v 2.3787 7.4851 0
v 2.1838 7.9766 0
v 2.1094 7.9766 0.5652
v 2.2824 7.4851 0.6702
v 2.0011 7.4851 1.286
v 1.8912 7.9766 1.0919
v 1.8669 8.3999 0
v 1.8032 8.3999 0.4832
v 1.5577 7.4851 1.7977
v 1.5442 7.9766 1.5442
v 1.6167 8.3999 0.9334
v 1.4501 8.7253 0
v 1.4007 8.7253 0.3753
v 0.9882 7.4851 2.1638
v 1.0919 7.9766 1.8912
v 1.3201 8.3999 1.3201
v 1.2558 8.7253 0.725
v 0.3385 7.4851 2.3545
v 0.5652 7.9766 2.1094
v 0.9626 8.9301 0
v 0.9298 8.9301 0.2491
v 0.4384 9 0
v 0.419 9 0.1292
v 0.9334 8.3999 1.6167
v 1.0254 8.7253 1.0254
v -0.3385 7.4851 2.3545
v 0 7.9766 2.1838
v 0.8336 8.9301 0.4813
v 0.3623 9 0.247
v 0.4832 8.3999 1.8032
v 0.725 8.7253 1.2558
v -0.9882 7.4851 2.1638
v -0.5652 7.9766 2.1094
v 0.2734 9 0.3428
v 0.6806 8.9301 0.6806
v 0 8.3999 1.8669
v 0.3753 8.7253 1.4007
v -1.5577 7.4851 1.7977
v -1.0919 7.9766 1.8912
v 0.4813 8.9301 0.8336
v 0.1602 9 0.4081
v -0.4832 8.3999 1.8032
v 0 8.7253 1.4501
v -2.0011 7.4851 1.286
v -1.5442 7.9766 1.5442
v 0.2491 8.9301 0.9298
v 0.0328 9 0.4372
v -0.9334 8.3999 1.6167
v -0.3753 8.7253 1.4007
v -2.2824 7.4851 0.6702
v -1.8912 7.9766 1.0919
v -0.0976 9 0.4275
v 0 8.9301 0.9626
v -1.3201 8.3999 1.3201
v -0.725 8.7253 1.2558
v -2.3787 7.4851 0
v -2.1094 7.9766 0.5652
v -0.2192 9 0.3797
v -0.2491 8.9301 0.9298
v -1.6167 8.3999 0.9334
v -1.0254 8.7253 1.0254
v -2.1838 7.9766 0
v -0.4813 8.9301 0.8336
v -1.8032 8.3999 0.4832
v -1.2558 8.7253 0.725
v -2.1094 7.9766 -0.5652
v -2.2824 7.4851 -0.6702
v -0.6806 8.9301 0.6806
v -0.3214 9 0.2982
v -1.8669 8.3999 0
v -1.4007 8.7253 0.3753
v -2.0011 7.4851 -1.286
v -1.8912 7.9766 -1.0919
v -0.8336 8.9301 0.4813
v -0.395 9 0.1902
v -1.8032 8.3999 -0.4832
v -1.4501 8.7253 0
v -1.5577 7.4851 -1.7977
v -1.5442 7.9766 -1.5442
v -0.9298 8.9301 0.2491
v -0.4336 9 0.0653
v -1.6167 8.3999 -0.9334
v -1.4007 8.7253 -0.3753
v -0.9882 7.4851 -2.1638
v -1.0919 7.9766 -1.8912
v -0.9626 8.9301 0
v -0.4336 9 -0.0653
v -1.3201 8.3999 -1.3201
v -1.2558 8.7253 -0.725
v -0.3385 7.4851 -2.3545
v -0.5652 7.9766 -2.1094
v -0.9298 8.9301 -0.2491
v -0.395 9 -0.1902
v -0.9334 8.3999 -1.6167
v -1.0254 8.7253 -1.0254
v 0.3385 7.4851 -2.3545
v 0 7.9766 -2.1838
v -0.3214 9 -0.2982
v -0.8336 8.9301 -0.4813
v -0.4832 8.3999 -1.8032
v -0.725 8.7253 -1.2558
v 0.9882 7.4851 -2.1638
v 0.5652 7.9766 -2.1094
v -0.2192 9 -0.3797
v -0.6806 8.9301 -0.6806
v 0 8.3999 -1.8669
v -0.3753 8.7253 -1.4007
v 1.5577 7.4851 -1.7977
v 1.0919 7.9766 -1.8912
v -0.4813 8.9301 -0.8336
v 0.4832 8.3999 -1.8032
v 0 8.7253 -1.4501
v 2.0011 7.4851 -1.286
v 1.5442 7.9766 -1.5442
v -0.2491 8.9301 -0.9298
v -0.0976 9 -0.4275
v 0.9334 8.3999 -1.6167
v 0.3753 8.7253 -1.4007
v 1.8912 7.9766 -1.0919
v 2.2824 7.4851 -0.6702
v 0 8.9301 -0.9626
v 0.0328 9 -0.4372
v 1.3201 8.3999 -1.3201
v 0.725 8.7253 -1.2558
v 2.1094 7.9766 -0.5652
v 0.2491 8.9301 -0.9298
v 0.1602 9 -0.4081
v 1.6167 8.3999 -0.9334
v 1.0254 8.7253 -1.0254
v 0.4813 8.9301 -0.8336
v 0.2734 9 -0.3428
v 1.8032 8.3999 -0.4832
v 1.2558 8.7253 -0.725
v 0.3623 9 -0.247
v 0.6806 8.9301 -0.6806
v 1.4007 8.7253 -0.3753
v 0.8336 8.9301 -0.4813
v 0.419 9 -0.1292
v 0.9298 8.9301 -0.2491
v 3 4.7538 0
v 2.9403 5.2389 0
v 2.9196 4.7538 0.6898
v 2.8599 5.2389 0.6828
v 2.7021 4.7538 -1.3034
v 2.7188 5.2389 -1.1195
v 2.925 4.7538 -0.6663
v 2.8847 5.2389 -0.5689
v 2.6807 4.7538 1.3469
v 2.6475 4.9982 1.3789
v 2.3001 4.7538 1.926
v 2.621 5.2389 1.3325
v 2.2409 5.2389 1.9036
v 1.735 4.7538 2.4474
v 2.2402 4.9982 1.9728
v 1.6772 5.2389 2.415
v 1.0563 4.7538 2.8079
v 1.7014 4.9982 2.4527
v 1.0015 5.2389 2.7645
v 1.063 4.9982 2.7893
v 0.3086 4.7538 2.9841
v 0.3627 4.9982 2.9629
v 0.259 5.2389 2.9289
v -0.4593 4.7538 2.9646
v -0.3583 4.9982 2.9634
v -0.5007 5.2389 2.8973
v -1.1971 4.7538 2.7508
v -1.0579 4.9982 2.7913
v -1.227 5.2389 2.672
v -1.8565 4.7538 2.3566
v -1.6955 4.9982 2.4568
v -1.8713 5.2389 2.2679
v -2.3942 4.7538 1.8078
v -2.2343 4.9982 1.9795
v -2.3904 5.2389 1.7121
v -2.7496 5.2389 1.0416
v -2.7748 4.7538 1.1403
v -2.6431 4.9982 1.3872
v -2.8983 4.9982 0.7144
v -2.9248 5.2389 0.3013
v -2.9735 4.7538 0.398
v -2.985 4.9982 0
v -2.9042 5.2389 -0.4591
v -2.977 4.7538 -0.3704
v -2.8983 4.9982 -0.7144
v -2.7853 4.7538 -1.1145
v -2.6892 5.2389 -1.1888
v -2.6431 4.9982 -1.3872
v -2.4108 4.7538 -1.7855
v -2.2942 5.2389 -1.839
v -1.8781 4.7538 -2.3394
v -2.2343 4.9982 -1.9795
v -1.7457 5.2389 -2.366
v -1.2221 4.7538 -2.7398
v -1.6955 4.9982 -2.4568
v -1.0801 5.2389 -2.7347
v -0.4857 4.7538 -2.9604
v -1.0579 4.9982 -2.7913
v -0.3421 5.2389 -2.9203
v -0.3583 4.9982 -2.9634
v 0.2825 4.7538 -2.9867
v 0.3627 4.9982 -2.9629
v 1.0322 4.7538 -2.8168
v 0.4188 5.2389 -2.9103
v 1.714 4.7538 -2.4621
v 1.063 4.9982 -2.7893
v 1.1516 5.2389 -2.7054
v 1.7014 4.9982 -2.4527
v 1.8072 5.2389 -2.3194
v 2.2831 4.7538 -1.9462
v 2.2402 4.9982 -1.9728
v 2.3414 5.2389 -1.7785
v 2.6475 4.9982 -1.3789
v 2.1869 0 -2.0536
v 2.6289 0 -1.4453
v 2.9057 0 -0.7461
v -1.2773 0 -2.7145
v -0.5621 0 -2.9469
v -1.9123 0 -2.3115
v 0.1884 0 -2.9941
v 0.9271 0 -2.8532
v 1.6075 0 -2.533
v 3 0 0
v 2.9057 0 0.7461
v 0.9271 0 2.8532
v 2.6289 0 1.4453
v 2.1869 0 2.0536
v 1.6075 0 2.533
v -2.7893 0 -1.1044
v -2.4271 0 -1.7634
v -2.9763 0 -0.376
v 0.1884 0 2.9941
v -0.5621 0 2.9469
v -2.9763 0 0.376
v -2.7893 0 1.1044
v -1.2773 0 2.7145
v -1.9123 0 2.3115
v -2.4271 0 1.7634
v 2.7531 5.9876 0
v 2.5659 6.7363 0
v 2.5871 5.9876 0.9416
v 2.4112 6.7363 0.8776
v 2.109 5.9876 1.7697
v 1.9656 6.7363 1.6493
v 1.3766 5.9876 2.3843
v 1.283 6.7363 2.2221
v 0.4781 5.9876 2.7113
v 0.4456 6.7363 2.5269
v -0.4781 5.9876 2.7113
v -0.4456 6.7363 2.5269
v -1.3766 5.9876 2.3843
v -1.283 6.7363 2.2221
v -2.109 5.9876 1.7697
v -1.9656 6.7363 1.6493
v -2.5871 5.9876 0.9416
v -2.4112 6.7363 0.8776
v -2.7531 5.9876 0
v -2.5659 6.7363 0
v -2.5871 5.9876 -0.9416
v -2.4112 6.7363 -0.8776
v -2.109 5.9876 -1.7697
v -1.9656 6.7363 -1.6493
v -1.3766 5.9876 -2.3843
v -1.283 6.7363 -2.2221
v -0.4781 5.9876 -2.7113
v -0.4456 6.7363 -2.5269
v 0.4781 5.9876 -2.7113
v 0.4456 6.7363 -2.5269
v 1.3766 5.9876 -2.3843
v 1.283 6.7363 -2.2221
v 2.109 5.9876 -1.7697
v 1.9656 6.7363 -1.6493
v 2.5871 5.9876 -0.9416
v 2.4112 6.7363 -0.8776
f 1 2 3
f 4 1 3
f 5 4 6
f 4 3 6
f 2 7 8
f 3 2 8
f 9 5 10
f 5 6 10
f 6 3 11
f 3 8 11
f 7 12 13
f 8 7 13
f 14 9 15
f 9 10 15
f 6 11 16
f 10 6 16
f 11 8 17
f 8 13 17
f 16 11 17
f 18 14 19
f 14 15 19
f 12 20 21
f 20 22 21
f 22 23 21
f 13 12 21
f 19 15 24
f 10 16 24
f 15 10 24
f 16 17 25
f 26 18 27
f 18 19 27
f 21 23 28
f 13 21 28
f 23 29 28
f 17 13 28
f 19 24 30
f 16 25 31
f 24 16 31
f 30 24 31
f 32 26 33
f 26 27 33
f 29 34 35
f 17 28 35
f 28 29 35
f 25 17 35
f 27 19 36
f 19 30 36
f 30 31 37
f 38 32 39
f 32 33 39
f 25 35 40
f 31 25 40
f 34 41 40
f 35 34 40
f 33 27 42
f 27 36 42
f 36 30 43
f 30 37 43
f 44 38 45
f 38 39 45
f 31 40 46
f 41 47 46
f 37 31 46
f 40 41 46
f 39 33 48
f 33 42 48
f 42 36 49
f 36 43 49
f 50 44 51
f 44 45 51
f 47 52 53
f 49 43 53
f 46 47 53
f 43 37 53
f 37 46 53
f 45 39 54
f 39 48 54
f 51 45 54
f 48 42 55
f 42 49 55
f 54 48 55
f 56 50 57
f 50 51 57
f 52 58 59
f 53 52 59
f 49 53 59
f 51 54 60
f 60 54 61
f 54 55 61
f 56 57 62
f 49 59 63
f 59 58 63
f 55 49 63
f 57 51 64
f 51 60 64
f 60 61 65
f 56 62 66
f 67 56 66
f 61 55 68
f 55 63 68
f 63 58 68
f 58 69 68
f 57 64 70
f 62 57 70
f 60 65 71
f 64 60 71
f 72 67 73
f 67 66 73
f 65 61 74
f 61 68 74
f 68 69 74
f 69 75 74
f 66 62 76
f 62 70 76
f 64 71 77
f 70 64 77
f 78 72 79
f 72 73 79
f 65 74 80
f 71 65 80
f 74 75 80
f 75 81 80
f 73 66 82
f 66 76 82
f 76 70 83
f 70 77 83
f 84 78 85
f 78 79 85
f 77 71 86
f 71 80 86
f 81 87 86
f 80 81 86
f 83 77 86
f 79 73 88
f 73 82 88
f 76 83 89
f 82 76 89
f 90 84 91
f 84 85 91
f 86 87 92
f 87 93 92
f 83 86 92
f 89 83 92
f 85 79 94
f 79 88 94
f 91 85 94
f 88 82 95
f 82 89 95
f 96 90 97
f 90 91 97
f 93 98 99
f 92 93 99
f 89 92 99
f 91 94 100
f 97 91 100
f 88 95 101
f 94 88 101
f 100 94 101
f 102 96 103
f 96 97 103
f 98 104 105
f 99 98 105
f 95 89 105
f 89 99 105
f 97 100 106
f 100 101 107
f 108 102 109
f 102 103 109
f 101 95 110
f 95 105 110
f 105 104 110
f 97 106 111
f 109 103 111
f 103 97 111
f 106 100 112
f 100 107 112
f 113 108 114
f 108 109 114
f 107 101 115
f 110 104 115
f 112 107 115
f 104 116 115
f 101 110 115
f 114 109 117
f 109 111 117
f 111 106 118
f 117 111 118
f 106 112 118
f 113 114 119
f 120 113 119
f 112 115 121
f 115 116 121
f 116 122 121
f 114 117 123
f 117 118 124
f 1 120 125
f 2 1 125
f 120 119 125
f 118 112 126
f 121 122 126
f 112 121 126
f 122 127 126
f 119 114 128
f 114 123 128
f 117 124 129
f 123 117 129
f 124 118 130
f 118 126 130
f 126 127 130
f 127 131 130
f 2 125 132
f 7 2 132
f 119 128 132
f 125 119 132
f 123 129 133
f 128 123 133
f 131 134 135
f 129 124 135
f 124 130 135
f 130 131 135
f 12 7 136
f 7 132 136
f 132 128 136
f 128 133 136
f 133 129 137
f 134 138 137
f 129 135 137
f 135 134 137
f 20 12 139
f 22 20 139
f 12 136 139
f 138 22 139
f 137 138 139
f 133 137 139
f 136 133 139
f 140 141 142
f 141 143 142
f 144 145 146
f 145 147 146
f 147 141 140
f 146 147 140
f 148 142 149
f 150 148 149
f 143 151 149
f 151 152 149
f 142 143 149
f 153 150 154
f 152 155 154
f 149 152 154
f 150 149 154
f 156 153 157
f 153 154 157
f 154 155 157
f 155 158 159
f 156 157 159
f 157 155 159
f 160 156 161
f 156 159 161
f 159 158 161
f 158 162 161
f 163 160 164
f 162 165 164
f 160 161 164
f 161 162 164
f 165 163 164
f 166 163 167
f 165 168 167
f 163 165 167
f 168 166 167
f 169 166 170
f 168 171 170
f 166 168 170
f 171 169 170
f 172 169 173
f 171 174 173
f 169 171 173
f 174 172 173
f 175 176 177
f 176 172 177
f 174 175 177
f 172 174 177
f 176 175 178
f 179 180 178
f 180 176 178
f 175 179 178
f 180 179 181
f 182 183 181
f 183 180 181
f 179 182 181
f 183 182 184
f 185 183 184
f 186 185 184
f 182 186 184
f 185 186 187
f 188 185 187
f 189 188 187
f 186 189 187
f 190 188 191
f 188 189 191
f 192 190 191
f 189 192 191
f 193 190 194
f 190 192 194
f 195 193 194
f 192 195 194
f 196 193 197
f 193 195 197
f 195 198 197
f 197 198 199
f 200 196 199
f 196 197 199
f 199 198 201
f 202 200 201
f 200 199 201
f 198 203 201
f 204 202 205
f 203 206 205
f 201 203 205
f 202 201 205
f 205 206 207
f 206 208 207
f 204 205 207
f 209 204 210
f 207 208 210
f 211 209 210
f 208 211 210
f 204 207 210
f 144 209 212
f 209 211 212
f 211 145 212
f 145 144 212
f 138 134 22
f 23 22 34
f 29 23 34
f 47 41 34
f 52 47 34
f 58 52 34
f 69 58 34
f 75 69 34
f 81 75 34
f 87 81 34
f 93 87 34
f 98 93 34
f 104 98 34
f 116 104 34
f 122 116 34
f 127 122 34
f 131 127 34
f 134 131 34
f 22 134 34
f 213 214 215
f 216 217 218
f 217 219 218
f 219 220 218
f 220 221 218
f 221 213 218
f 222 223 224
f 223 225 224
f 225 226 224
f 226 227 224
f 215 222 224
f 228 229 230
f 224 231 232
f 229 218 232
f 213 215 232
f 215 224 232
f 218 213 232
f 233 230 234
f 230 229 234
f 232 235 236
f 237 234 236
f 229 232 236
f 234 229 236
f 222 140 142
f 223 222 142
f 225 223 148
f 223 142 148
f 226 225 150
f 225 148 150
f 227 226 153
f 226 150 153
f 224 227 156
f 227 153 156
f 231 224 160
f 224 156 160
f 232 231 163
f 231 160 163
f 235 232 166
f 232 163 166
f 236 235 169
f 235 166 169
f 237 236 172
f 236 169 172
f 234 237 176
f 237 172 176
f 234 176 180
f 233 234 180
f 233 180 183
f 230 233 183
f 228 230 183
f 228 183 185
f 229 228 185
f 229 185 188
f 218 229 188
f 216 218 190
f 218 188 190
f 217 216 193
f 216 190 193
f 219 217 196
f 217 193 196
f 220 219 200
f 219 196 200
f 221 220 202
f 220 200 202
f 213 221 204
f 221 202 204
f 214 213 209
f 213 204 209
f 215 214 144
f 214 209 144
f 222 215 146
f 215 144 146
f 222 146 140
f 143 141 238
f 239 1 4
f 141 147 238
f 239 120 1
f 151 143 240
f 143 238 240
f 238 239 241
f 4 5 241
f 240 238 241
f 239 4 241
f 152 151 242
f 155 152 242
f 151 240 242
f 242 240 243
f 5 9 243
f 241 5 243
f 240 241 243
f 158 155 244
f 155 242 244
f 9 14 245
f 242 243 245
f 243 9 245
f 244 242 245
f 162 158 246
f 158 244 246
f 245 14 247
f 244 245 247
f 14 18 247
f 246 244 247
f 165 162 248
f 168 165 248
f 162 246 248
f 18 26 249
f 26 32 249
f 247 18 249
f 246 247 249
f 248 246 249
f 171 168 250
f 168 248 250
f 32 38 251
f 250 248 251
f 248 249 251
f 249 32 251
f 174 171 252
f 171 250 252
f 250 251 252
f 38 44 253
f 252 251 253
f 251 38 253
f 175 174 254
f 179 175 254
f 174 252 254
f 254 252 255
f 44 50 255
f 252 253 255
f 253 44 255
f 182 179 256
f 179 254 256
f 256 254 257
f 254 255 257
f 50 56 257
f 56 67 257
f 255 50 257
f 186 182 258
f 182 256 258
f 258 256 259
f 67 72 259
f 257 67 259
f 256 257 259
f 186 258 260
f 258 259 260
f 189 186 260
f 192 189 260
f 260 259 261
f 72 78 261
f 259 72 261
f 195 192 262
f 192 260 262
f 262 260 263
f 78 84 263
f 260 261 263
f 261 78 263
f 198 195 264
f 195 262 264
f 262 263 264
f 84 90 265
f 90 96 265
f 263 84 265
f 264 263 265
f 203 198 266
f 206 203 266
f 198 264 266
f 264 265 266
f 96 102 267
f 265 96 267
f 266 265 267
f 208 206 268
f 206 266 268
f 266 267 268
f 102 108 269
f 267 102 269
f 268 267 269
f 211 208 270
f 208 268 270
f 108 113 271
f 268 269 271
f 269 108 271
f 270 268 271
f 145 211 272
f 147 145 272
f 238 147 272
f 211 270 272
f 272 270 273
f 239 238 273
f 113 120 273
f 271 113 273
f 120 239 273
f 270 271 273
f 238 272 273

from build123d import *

# Parameters (mm, degrees)
FILLET1_R = 2
FILLET2_R = 2


with BuildPart() as part:
    # Sketch1 → Revolve1 (revolve)
    with BuildSketch(Plane.XY):
        Polygon((0, 0), (3, 0), (3, 5), (2, 9), (0, 9), align=None)
    revolve(axis=Axis((0, 9, 0), (0, -1, 0)))

    # Fillet1
    fillet1_edges = [part.edges().sort_by_distance(p)[0] for p in [
        (-2, 9, 0),
    ]]
    fillet(fillet1_edges, radius=FILLET1_R)

    # Fillet2
    fillet2_edges = [part.edges().sort_by_distance(p)[0] for p in [
        (-3, 5, 0),
    ]]
    fillet(fillet2_edges, radius=FILLET2_R)


solid = part.part
